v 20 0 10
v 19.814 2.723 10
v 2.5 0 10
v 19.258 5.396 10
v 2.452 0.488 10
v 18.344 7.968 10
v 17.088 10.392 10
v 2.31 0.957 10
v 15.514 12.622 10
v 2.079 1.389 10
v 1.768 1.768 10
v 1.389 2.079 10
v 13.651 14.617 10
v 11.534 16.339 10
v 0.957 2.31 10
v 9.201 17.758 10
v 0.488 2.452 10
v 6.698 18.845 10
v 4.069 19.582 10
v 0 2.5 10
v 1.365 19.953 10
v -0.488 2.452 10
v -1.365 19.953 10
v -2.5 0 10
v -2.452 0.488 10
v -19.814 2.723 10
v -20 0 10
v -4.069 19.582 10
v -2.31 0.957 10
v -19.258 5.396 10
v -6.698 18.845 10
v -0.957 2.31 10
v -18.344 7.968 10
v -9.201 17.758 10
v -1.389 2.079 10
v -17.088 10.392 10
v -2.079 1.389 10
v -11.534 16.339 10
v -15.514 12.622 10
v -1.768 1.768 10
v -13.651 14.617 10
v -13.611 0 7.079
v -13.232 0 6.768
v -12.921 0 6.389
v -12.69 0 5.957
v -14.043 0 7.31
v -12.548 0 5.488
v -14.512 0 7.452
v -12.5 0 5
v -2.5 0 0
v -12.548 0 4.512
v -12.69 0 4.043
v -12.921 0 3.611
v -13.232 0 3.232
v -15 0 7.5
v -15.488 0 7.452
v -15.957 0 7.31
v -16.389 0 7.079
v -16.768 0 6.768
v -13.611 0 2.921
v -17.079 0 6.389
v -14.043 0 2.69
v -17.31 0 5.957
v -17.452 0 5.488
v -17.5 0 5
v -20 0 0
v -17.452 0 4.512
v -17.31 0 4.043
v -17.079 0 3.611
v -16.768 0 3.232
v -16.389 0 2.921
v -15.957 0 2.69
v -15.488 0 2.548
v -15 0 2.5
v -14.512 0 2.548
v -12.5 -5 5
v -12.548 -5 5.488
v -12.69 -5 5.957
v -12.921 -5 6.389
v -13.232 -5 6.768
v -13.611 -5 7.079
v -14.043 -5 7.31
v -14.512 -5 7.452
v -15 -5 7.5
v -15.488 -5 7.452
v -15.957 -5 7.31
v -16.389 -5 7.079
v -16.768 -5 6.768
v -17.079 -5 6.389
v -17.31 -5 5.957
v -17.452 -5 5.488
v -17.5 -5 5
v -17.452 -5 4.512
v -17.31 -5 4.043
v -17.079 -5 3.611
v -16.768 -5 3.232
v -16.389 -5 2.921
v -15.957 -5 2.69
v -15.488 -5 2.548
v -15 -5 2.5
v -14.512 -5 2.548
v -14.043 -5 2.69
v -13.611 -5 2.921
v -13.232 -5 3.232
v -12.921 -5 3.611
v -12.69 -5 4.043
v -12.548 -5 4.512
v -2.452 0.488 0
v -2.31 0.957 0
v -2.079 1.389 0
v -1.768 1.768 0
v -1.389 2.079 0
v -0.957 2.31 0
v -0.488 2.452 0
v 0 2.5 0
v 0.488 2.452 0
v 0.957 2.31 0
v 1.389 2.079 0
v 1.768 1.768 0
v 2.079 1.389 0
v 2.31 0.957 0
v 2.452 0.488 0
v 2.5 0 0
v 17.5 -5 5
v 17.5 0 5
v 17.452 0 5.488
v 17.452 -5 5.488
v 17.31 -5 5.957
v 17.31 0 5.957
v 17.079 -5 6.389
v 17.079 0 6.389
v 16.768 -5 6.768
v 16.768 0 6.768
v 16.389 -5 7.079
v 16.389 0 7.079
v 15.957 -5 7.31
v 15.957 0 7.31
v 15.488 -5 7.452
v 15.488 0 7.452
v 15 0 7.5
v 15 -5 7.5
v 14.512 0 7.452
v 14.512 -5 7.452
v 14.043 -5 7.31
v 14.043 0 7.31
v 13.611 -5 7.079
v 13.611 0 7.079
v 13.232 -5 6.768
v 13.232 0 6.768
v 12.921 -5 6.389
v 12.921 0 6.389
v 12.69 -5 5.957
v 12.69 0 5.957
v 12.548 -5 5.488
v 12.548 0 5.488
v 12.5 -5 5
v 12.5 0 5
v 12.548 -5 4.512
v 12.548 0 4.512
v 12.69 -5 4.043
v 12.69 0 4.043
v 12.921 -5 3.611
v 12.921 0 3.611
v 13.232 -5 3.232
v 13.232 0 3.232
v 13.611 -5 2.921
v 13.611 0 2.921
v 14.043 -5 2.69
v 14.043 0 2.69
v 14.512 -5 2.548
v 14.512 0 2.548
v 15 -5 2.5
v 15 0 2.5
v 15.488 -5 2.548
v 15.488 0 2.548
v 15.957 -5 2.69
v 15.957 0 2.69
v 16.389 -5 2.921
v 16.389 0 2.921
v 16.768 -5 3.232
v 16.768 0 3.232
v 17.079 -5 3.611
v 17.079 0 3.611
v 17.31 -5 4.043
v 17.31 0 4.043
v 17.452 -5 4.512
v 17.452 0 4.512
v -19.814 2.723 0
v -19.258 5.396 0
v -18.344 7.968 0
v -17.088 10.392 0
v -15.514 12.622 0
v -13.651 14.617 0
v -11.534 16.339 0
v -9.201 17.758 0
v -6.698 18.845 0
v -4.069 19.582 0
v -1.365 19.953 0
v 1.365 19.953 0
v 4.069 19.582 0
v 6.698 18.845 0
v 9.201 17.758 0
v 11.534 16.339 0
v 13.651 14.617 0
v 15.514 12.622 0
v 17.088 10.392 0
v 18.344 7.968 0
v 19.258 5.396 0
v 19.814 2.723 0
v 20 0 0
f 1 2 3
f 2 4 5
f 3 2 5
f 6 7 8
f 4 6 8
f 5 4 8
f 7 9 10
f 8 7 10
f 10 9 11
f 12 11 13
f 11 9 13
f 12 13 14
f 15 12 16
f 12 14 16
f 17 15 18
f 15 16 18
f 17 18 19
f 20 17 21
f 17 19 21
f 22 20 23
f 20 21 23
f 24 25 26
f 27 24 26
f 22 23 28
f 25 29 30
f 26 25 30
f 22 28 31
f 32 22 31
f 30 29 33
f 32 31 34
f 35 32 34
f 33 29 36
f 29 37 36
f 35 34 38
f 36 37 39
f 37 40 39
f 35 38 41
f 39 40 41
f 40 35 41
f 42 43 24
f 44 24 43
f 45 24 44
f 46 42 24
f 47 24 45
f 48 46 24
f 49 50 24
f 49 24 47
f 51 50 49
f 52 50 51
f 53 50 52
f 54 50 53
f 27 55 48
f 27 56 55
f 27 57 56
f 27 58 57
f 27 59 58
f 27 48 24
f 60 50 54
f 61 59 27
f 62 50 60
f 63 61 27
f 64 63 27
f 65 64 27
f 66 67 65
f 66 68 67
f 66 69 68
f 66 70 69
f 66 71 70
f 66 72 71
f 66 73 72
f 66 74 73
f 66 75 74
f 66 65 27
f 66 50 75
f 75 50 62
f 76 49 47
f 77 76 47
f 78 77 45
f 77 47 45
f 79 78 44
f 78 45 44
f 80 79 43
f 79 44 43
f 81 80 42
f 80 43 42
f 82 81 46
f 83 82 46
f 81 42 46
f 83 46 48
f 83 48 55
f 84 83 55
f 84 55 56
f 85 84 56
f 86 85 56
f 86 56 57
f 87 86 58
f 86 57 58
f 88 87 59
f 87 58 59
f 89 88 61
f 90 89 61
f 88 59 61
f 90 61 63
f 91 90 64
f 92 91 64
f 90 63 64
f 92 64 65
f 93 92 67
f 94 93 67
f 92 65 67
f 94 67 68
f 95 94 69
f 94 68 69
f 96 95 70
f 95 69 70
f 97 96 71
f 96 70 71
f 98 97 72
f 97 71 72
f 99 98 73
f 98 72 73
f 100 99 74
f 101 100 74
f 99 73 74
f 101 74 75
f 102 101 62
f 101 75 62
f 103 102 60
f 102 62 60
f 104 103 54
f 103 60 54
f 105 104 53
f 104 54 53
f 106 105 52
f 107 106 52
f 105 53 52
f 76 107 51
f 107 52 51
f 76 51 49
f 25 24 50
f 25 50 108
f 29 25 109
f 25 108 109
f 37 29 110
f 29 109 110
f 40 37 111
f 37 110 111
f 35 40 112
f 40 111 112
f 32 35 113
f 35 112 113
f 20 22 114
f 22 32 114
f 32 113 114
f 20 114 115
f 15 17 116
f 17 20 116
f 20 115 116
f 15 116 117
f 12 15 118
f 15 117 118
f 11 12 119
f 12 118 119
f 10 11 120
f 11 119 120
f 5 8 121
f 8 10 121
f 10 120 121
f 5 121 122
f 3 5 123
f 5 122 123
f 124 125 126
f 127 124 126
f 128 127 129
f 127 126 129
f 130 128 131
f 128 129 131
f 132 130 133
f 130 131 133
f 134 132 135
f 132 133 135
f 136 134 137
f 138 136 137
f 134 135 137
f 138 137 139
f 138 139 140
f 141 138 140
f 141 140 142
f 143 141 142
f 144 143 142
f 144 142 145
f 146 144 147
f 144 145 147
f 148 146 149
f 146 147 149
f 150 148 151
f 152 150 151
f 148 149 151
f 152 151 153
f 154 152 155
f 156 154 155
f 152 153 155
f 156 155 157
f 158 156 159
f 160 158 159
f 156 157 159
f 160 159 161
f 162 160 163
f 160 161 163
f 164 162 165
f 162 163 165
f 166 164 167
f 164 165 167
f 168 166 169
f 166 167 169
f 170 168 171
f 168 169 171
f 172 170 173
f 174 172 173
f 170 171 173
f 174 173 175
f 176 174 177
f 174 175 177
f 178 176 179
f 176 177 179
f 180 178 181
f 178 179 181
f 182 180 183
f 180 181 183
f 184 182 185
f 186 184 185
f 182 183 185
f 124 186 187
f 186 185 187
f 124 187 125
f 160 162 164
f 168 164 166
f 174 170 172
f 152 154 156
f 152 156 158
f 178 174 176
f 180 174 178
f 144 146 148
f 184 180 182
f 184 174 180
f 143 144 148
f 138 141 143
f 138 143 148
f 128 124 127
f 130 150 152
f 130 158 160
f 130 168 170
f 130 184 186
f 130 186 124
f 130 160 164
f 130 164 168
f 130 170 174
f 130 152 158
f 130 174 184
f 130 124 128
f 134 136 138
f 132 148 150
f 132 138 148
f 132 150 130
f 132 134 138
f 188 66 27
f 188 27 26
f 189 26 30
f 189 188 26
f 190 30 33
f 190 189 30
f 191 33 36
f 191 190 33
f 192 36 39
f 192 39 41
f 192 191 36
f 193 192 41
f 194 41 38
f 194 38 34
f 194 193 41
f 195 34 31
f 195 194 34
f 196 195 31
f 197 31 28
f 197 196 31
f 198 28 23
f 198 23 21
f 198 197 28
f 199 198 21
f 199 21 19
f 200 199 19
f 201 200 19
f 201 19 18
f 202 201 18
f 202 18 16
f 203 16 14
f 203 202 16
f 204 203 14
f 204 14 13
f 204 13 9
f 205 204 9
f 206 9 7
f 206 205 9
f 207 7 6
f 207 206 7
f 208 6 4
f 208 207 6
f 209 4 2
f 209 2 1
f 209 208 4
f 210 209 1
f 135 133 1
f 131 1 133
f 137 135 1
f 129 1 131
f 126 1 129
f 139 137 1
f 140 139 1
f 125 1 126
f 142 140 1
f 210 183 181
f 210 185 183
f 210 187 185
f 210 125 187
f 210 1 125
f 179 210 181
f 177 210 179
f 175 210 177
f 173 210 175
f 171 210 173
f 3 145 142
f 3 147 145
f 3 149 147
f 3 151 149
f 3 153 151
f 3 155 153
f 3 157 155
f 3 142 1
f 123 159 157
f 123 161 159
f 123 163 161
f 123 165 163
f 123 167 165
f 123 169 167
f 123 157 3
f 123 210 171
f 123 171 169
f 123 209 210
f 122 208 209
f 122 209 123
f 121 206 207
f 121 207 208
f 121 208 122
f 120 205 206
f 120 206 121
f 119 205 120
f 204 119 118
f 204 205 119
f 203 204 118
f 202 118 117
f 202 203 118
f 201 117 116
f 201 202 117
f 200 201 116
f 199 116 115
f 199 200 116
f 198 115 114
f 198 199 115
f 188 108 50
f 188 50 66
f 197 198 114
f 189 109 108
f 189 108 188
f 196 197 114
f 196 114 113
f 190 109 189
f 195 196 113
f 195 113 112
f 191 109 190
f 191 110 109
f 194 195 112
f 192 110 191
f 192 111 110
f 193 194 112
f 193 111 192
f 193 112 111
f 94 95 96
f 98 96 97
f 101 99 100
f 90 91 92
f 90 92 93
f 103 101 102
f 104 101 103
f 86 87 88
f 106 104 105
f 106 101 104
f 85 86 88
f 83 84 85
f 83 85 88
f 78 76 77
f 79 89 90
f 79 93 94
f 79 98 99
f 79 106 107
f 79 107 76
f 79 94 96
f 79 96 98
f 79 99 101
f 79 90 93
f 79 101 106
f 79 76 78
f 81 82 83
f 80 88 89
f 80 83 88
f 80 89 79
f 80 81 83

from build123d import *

# Parameters (mm, degrees)
BOSS_EXTRUDE1_DEPTH = 10
SKETCH4_W           = 10
SKETCH4_H           = 2.5
SKETCH5_R           = 2.5
BOSS_EXTRUDE2_DEPTH = 5


with BuildPart() as part:
    # Sketch2 → Boss-Extrude1 (new body)
    with BuildSketch(Plane.XY):
        with BuildLine():
            Line((20, 0), (-20, 0))
            ThreePointArc((-20, 0), (0, 20), (20, 0))
        make_face()
    extrude(amount=BOSS_EXTRUDE1_DEPTH)

    # Sketch4 → Cut-Revolve1 (revolve, cut)
    with BuildSketch(Plane(origin=(0, 0, 0), x_dir=(0, 0, -1), z_dir=(1, 0, 0))):
        with Locations((-5, 1.25)):
            Rectangle(SKETCH4_W, SKETCH4_H)
    revolve(axis=Axis((0, 0, 17.133909945), (0, 0, -1)), mode=Mode.SUBTRACT)

    # Sketch5 → Boss-Extrude2 (add)
    with BuildSketch(Plane.XZ):
        with Locations((-15, 5)):
            Circle(SKETCH5_R)
        with Locations((15, 5)):
            Circle(SKETCH5_R)
    extrude(amount=BOSS_EXTRUDE2_DEPTH)


solid = part.part
